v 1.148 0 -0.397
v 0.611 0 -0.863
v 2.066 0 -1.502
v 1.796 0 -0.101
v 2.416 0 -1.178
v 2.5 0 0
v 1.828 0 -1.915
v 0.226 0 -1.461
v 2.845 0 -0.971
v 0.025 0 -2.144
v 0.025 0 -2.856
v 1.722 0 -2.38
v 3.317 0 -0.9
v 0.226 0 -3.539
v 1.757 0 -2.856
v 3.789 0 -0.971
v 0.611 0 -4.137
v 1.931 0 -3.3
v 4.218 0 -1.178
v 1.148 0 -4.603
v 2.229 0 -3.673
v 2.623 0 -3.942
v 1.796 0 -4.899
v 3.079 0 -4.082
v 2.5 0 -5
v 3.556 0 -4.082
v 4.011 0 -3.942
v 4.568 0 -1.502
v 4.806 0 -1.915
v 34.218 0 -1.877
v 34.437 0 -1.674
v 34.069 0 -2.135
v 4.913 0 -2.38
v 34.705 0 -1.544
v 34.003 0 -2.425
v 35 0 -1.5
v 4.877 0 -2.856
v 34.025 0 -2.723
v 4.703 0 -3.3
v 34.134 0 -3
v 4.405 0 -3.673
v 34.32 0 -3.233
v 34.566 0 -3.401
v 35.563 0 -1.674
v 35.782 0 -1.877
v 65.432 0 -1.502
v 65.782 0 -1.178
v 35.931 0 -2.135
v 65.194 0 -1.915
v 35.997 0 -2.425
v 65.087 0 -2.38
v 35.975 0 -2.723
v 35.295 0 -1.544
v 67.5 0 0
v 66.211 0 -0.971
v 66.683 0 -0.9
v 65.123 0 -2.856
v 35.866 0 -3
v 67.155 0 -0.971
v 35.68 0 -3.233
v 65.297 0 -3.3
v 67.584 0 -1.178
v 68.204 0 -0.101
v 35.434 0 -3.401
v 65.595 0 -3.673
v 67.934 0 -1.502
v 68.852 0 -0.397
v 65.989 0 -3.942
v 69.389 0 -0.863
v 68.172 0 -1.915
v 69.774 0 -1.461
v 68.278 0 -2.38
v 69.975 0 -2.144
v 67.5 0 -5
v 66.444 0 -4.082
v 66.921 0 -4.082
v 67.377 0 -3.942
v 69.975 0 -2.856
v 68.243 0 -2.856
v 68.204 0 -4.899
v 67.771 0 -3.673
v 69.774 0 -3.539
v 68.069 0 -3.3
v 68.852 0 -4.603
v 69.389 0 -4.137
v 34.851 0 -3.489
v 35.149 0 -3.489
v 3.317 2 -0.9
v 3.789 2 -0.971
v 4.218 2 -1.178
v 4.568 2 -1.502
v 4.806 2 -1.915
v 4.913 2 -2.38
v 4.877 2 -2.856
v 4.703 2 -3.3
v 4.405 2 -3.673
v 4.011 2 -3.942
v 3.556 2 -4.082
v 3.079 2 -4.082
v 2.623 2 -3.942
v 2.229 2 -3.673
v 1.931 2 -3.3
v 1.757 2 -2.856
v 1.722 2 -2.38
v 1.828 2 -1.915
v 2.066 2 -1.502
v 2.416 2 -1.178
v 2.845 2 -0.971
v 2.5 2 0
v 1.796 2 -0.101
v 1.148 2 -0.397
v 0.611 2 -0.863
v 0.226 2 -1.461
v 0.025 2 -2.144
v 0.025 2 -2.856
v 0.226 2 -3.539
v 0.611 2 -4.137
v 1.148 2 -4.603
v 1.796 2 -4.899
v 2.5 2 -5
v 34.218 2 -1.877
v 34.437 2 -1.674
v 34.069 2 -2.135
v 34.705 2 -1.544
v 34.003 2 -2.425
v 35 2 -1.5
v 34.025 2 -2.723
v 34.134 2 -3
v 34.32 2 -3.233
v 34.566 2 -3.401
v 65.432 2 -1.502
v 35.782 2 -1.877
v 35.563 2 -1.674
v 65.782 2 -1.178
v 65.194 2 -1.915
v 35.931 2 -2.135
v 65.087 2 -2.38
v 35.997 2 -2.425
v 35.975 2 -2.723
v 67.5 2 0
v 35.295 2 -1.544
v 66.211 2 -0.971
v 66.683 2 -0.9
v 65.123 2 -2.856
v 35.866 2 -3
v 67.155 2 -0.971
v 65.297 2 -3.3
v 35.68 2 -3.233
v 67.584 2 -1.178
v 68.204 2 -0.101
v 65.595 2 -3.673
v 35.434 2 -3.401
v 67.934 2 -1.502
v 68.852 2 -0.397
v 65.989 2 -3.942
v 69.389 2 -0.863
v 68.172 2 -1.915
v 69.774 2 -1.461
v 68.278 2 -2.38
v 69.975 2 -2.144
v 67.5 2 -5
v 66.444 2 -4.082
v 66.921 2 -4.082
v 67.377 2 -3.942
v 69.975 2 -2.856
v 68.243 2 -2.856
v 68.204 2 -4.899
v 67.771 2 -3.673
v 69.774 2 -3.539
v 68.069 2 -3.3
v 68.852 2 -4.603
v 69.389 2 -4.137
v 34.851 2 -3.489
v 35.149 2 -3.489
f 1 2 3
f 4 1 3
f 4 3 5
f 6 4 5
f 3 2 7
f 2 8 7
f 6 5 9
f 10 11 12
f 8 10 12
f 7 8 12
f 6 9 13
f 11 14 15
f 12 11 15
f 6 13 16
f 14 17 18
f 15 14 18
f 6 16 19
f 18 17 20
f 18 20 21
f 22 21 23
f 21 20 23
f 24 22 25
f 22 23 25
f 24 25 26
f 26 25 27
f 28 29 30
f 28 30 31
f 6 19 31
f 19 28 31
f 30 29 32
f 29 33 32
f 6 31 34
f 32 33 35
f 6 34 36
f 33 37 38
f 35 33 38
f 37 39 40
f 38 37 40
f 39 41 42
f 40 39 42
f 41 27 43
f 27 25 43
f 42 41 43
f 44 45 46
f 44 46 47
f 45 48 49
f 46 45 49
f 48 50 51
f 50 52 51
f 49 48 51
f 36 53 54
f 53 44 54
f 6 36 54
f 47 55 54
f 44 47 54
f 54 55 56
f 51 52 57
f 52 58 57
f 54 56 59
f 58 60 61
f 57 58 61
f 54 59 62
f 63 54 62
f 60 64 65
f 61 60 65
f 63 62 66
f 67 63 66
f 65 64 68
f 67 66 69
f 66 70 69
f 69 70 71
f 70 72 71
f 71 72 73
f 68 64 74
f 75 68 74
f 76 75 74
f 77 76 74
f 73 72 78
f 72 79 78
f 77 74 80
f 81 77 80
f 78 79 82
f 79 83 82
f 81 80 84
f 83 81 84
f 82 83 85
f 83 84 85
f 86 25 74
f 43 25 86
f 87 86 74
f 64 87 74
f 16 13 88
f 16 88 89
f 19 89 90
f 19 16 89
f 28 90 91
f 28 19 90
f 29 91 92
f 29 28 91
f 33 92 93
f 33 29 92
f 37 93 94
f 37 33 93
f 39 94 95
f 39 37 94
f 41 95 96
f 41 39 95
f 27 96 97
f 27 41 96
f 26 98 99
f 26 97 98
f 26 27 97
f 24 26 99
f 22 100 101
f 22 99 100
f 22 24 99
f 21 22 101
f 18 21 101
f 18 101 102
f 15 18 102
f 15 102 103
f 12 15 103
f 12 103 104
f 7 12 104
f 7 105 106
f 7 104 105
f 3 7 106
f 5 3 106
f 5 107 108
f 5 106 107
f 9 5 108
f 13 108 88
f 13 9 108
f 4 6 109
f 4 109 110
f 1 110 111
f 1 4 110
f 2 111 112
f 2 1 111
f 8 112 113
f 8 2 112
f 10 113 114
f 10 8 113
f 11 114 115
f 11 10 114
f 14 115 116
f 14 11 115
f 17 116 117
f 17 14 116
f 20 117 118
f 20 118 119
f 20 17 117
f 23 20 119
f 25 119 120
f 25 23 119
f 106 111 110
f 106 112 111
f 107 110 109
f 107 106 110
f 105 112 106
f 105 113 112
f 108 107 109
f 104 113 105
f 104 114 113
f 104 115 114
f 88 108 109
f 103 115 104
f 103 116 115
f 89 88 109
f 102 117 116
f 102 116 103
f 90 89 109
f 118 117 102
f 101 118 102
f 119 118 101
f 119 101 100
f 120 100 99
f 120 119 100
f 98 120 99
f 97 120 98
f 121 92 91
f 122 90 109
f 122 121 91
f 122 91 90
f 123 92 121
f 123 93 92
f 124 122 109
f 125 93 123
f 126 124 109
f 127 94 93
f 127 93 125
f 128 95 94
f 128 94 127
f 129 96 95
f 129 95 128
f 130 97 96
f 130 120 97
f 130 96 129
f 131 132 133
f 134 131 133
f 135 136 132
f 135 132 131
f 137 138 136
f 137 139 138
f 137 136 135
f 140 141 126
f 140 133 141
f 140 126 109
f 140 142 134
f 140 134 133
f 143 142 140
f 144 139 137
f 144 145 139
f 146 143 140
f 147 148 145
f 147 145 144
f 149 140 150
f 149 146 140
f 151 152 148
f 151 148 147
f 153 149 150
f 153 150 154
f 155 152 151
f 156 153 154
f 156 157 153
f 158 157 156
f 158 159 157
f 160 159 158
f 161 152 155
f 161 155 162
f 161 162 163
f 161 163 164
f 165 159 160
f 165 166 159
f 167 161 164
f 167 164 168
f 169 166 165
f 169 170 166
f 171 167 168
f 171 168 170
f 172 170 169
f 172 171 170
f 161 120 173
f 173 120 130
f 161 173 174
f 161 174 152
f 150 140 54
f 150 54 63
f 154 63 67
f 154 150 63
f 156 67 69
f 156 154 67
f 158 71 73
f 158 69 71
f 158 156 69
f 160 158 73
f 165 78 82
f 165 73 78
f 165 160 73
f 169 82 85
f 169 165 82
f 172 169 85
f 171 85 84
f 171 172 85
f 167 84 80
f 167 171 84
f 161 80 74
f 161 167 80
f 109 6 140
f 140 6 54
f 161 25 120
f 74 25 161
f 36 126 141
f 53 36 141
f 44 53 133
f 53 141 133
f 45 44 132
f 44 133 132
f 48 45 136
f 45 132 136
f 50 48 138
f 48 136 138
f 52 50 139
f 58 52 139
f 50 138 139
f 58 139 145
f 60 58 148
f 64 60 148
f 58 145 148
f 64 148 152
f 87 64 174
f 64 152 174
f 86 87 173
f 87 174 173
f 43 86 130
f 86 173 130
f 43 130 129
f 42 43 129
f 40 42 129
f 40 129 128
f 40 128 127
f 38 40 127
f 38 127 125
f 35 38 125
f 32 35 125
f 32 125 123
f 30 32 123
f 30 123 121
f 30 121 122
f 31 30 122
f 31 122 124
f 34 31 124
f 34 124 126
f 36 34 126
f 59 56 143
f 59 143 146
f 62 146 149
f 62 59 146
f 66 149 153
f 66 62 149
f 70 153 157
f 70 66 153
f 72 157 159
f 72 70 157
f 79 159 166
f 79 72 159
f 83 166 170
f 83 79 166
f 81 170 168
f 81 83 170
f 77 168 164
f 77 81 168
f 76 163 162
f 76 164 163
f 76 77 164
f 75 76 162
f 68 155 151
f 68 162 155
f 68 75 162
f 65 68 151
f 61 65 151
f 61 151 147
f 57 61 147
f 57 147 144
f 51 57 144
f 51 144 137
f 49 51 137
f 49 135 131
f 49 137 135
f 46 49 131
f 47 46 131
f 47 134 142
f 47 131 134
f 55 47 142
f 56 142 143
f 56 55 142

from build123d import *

# Parameters (mm, degrees)
SKETCH1_W               = 70
SKETCH1_H               = 5
BOSS_EXTRUDE1_DEPTH     = 2
CUT_EXTRUDE1_DEPTH      = 71.206837274
CUT_EXTRUDE1_DEPTH_BACK = 71.206837274
SKETCH2_R               = 1.6
CUT_EXTRUDE2_REACH      = 72.207
SKETCH4_R               = 1
FILLET2_RADIUS          = 2.5
FILLET2_LENGTH          = 2
FILLET3_RADIUS          = 2.5
FILLET3_LENGTH          = 2


with BuildPart() as part:
    # Sketch1 → Boss-Extrude1 (new body)
    with BuildSketch(Plane(origin=(0, 0, 0), x_dir=(1, 0, 0), z_dir=(0, 1, 0))):
        with Locations((35, 2.5)):
            Rectangle(SKETCH1_W, SKETCH1_H)
    extrude(amount=BOSS_EXTRUDE1_DEPTH)

    # Sketch2 → Cut-Extrude1 (cut, two sides: drawn at the far end of the back side and taken through both)
    with BuildSketch(Plane(origin=(0, 2, 0), x_dir=(1, 0, 0), z_dir=(0, 1, 0)).offset(-CUT_EXTRUDE1_DEPTH_BACK)):
        with Locations(Location((66.682907, 2.5, 0), (0, 0, 270))):
            Circle(SKETCH2_R)
        with Locations(Location((3.317093, 2.5, 0), (0, 0, 270))):
            Circle(SKETCH2_R)
    extrude(amount=CUT_EXTRUDE1_DEPTH + CUT_EXTRUDE1_DEPTH_BACK, mode=Mode.SUBTRACT)

    # Sketch4 → Cut-Extrude2 (cut, up to next)
    with BuildSketch(Plane(origin=(0, 2, 0), x_dir=(1, 0, 0), z_dir=(0, 1, 0)), mode=Mode.PRIVATE) as cut_extrude2_sk1:
        with Locations(Location((35, 2.5, 0), (0, 0, 270))):
            Circle(SKETCH4_R)
    cut_extrude2_tool1 = extrude(cut_extrude2_sk1.sketch, amount=-CUT_EXTRUDE2_REACH, mode=Mode.PRIVATE) & part.part
    add(cut_extrude2_tool1.solids().sort_by_distance((35, 2, -2.5))[0], mode=Mode.SUBTRACT)

    # Fillet2: full round fillet: the end face becomes a half cylinder, R = half its width
    fillet2_face = Plane((0, 1, -2.5), x_dir=(0, -1, 0), z_dir=(-1, 0, 0))  # on the end face: x along it, z out of the body
    fillet2_slab = fillet2_face.offset(-FILLET2_RADIUS / 2) * Box(FILLET2_LENGTH, 2 * FILLET2_RADIUS, FILLET2_RADIUS, mode=Mode.PRIVATE)  # the body's end, R deep
    fillet2_round = Plane((2.5, 1, -2.5), x_dir=(-1, 0, 0), z_dir=(0, -1, 0)) * Cylinder(FILLET2_RADIUS, FILLET2_LENGTH, mode=Mode.PRIVATE)  # its axis R under the face
    add(fillet2_slab - fillet2_round, mode=Mode.SUBTRACT)

    # Fillet3: full round fillet: the end face becomes a half cylinder, R = half its width
    fillet3_face = Plane((70, 1, -2.5), x_dir=(0, 1, 0), z_dir=(1, 0, 0))  # on the end face: x along it, z out of the body
    fillet3_slab = fillet3_face.offset(-FILLET3_RADIUS / 2) * Box(FILLET3_LENGTH, 2 * FILLET3_RADIUS, FILLET3_RADIUS, mode=Mode.PRIVATE)  # the body's end, R deep
    fillet3_round = Plane((67.5, 1, -2.5), x_dir=(1, 0, 0), z_dir=(0, 1, 0)) * Cylinder(FILLET3_RADIUS, FILLET3_LENGTH, mode=Mode.PRIVATE)  # its axis R under the face
    add(fillet3_slab - fillet3_round, mode=Mode.SUBTRACT)


solid = part.part
